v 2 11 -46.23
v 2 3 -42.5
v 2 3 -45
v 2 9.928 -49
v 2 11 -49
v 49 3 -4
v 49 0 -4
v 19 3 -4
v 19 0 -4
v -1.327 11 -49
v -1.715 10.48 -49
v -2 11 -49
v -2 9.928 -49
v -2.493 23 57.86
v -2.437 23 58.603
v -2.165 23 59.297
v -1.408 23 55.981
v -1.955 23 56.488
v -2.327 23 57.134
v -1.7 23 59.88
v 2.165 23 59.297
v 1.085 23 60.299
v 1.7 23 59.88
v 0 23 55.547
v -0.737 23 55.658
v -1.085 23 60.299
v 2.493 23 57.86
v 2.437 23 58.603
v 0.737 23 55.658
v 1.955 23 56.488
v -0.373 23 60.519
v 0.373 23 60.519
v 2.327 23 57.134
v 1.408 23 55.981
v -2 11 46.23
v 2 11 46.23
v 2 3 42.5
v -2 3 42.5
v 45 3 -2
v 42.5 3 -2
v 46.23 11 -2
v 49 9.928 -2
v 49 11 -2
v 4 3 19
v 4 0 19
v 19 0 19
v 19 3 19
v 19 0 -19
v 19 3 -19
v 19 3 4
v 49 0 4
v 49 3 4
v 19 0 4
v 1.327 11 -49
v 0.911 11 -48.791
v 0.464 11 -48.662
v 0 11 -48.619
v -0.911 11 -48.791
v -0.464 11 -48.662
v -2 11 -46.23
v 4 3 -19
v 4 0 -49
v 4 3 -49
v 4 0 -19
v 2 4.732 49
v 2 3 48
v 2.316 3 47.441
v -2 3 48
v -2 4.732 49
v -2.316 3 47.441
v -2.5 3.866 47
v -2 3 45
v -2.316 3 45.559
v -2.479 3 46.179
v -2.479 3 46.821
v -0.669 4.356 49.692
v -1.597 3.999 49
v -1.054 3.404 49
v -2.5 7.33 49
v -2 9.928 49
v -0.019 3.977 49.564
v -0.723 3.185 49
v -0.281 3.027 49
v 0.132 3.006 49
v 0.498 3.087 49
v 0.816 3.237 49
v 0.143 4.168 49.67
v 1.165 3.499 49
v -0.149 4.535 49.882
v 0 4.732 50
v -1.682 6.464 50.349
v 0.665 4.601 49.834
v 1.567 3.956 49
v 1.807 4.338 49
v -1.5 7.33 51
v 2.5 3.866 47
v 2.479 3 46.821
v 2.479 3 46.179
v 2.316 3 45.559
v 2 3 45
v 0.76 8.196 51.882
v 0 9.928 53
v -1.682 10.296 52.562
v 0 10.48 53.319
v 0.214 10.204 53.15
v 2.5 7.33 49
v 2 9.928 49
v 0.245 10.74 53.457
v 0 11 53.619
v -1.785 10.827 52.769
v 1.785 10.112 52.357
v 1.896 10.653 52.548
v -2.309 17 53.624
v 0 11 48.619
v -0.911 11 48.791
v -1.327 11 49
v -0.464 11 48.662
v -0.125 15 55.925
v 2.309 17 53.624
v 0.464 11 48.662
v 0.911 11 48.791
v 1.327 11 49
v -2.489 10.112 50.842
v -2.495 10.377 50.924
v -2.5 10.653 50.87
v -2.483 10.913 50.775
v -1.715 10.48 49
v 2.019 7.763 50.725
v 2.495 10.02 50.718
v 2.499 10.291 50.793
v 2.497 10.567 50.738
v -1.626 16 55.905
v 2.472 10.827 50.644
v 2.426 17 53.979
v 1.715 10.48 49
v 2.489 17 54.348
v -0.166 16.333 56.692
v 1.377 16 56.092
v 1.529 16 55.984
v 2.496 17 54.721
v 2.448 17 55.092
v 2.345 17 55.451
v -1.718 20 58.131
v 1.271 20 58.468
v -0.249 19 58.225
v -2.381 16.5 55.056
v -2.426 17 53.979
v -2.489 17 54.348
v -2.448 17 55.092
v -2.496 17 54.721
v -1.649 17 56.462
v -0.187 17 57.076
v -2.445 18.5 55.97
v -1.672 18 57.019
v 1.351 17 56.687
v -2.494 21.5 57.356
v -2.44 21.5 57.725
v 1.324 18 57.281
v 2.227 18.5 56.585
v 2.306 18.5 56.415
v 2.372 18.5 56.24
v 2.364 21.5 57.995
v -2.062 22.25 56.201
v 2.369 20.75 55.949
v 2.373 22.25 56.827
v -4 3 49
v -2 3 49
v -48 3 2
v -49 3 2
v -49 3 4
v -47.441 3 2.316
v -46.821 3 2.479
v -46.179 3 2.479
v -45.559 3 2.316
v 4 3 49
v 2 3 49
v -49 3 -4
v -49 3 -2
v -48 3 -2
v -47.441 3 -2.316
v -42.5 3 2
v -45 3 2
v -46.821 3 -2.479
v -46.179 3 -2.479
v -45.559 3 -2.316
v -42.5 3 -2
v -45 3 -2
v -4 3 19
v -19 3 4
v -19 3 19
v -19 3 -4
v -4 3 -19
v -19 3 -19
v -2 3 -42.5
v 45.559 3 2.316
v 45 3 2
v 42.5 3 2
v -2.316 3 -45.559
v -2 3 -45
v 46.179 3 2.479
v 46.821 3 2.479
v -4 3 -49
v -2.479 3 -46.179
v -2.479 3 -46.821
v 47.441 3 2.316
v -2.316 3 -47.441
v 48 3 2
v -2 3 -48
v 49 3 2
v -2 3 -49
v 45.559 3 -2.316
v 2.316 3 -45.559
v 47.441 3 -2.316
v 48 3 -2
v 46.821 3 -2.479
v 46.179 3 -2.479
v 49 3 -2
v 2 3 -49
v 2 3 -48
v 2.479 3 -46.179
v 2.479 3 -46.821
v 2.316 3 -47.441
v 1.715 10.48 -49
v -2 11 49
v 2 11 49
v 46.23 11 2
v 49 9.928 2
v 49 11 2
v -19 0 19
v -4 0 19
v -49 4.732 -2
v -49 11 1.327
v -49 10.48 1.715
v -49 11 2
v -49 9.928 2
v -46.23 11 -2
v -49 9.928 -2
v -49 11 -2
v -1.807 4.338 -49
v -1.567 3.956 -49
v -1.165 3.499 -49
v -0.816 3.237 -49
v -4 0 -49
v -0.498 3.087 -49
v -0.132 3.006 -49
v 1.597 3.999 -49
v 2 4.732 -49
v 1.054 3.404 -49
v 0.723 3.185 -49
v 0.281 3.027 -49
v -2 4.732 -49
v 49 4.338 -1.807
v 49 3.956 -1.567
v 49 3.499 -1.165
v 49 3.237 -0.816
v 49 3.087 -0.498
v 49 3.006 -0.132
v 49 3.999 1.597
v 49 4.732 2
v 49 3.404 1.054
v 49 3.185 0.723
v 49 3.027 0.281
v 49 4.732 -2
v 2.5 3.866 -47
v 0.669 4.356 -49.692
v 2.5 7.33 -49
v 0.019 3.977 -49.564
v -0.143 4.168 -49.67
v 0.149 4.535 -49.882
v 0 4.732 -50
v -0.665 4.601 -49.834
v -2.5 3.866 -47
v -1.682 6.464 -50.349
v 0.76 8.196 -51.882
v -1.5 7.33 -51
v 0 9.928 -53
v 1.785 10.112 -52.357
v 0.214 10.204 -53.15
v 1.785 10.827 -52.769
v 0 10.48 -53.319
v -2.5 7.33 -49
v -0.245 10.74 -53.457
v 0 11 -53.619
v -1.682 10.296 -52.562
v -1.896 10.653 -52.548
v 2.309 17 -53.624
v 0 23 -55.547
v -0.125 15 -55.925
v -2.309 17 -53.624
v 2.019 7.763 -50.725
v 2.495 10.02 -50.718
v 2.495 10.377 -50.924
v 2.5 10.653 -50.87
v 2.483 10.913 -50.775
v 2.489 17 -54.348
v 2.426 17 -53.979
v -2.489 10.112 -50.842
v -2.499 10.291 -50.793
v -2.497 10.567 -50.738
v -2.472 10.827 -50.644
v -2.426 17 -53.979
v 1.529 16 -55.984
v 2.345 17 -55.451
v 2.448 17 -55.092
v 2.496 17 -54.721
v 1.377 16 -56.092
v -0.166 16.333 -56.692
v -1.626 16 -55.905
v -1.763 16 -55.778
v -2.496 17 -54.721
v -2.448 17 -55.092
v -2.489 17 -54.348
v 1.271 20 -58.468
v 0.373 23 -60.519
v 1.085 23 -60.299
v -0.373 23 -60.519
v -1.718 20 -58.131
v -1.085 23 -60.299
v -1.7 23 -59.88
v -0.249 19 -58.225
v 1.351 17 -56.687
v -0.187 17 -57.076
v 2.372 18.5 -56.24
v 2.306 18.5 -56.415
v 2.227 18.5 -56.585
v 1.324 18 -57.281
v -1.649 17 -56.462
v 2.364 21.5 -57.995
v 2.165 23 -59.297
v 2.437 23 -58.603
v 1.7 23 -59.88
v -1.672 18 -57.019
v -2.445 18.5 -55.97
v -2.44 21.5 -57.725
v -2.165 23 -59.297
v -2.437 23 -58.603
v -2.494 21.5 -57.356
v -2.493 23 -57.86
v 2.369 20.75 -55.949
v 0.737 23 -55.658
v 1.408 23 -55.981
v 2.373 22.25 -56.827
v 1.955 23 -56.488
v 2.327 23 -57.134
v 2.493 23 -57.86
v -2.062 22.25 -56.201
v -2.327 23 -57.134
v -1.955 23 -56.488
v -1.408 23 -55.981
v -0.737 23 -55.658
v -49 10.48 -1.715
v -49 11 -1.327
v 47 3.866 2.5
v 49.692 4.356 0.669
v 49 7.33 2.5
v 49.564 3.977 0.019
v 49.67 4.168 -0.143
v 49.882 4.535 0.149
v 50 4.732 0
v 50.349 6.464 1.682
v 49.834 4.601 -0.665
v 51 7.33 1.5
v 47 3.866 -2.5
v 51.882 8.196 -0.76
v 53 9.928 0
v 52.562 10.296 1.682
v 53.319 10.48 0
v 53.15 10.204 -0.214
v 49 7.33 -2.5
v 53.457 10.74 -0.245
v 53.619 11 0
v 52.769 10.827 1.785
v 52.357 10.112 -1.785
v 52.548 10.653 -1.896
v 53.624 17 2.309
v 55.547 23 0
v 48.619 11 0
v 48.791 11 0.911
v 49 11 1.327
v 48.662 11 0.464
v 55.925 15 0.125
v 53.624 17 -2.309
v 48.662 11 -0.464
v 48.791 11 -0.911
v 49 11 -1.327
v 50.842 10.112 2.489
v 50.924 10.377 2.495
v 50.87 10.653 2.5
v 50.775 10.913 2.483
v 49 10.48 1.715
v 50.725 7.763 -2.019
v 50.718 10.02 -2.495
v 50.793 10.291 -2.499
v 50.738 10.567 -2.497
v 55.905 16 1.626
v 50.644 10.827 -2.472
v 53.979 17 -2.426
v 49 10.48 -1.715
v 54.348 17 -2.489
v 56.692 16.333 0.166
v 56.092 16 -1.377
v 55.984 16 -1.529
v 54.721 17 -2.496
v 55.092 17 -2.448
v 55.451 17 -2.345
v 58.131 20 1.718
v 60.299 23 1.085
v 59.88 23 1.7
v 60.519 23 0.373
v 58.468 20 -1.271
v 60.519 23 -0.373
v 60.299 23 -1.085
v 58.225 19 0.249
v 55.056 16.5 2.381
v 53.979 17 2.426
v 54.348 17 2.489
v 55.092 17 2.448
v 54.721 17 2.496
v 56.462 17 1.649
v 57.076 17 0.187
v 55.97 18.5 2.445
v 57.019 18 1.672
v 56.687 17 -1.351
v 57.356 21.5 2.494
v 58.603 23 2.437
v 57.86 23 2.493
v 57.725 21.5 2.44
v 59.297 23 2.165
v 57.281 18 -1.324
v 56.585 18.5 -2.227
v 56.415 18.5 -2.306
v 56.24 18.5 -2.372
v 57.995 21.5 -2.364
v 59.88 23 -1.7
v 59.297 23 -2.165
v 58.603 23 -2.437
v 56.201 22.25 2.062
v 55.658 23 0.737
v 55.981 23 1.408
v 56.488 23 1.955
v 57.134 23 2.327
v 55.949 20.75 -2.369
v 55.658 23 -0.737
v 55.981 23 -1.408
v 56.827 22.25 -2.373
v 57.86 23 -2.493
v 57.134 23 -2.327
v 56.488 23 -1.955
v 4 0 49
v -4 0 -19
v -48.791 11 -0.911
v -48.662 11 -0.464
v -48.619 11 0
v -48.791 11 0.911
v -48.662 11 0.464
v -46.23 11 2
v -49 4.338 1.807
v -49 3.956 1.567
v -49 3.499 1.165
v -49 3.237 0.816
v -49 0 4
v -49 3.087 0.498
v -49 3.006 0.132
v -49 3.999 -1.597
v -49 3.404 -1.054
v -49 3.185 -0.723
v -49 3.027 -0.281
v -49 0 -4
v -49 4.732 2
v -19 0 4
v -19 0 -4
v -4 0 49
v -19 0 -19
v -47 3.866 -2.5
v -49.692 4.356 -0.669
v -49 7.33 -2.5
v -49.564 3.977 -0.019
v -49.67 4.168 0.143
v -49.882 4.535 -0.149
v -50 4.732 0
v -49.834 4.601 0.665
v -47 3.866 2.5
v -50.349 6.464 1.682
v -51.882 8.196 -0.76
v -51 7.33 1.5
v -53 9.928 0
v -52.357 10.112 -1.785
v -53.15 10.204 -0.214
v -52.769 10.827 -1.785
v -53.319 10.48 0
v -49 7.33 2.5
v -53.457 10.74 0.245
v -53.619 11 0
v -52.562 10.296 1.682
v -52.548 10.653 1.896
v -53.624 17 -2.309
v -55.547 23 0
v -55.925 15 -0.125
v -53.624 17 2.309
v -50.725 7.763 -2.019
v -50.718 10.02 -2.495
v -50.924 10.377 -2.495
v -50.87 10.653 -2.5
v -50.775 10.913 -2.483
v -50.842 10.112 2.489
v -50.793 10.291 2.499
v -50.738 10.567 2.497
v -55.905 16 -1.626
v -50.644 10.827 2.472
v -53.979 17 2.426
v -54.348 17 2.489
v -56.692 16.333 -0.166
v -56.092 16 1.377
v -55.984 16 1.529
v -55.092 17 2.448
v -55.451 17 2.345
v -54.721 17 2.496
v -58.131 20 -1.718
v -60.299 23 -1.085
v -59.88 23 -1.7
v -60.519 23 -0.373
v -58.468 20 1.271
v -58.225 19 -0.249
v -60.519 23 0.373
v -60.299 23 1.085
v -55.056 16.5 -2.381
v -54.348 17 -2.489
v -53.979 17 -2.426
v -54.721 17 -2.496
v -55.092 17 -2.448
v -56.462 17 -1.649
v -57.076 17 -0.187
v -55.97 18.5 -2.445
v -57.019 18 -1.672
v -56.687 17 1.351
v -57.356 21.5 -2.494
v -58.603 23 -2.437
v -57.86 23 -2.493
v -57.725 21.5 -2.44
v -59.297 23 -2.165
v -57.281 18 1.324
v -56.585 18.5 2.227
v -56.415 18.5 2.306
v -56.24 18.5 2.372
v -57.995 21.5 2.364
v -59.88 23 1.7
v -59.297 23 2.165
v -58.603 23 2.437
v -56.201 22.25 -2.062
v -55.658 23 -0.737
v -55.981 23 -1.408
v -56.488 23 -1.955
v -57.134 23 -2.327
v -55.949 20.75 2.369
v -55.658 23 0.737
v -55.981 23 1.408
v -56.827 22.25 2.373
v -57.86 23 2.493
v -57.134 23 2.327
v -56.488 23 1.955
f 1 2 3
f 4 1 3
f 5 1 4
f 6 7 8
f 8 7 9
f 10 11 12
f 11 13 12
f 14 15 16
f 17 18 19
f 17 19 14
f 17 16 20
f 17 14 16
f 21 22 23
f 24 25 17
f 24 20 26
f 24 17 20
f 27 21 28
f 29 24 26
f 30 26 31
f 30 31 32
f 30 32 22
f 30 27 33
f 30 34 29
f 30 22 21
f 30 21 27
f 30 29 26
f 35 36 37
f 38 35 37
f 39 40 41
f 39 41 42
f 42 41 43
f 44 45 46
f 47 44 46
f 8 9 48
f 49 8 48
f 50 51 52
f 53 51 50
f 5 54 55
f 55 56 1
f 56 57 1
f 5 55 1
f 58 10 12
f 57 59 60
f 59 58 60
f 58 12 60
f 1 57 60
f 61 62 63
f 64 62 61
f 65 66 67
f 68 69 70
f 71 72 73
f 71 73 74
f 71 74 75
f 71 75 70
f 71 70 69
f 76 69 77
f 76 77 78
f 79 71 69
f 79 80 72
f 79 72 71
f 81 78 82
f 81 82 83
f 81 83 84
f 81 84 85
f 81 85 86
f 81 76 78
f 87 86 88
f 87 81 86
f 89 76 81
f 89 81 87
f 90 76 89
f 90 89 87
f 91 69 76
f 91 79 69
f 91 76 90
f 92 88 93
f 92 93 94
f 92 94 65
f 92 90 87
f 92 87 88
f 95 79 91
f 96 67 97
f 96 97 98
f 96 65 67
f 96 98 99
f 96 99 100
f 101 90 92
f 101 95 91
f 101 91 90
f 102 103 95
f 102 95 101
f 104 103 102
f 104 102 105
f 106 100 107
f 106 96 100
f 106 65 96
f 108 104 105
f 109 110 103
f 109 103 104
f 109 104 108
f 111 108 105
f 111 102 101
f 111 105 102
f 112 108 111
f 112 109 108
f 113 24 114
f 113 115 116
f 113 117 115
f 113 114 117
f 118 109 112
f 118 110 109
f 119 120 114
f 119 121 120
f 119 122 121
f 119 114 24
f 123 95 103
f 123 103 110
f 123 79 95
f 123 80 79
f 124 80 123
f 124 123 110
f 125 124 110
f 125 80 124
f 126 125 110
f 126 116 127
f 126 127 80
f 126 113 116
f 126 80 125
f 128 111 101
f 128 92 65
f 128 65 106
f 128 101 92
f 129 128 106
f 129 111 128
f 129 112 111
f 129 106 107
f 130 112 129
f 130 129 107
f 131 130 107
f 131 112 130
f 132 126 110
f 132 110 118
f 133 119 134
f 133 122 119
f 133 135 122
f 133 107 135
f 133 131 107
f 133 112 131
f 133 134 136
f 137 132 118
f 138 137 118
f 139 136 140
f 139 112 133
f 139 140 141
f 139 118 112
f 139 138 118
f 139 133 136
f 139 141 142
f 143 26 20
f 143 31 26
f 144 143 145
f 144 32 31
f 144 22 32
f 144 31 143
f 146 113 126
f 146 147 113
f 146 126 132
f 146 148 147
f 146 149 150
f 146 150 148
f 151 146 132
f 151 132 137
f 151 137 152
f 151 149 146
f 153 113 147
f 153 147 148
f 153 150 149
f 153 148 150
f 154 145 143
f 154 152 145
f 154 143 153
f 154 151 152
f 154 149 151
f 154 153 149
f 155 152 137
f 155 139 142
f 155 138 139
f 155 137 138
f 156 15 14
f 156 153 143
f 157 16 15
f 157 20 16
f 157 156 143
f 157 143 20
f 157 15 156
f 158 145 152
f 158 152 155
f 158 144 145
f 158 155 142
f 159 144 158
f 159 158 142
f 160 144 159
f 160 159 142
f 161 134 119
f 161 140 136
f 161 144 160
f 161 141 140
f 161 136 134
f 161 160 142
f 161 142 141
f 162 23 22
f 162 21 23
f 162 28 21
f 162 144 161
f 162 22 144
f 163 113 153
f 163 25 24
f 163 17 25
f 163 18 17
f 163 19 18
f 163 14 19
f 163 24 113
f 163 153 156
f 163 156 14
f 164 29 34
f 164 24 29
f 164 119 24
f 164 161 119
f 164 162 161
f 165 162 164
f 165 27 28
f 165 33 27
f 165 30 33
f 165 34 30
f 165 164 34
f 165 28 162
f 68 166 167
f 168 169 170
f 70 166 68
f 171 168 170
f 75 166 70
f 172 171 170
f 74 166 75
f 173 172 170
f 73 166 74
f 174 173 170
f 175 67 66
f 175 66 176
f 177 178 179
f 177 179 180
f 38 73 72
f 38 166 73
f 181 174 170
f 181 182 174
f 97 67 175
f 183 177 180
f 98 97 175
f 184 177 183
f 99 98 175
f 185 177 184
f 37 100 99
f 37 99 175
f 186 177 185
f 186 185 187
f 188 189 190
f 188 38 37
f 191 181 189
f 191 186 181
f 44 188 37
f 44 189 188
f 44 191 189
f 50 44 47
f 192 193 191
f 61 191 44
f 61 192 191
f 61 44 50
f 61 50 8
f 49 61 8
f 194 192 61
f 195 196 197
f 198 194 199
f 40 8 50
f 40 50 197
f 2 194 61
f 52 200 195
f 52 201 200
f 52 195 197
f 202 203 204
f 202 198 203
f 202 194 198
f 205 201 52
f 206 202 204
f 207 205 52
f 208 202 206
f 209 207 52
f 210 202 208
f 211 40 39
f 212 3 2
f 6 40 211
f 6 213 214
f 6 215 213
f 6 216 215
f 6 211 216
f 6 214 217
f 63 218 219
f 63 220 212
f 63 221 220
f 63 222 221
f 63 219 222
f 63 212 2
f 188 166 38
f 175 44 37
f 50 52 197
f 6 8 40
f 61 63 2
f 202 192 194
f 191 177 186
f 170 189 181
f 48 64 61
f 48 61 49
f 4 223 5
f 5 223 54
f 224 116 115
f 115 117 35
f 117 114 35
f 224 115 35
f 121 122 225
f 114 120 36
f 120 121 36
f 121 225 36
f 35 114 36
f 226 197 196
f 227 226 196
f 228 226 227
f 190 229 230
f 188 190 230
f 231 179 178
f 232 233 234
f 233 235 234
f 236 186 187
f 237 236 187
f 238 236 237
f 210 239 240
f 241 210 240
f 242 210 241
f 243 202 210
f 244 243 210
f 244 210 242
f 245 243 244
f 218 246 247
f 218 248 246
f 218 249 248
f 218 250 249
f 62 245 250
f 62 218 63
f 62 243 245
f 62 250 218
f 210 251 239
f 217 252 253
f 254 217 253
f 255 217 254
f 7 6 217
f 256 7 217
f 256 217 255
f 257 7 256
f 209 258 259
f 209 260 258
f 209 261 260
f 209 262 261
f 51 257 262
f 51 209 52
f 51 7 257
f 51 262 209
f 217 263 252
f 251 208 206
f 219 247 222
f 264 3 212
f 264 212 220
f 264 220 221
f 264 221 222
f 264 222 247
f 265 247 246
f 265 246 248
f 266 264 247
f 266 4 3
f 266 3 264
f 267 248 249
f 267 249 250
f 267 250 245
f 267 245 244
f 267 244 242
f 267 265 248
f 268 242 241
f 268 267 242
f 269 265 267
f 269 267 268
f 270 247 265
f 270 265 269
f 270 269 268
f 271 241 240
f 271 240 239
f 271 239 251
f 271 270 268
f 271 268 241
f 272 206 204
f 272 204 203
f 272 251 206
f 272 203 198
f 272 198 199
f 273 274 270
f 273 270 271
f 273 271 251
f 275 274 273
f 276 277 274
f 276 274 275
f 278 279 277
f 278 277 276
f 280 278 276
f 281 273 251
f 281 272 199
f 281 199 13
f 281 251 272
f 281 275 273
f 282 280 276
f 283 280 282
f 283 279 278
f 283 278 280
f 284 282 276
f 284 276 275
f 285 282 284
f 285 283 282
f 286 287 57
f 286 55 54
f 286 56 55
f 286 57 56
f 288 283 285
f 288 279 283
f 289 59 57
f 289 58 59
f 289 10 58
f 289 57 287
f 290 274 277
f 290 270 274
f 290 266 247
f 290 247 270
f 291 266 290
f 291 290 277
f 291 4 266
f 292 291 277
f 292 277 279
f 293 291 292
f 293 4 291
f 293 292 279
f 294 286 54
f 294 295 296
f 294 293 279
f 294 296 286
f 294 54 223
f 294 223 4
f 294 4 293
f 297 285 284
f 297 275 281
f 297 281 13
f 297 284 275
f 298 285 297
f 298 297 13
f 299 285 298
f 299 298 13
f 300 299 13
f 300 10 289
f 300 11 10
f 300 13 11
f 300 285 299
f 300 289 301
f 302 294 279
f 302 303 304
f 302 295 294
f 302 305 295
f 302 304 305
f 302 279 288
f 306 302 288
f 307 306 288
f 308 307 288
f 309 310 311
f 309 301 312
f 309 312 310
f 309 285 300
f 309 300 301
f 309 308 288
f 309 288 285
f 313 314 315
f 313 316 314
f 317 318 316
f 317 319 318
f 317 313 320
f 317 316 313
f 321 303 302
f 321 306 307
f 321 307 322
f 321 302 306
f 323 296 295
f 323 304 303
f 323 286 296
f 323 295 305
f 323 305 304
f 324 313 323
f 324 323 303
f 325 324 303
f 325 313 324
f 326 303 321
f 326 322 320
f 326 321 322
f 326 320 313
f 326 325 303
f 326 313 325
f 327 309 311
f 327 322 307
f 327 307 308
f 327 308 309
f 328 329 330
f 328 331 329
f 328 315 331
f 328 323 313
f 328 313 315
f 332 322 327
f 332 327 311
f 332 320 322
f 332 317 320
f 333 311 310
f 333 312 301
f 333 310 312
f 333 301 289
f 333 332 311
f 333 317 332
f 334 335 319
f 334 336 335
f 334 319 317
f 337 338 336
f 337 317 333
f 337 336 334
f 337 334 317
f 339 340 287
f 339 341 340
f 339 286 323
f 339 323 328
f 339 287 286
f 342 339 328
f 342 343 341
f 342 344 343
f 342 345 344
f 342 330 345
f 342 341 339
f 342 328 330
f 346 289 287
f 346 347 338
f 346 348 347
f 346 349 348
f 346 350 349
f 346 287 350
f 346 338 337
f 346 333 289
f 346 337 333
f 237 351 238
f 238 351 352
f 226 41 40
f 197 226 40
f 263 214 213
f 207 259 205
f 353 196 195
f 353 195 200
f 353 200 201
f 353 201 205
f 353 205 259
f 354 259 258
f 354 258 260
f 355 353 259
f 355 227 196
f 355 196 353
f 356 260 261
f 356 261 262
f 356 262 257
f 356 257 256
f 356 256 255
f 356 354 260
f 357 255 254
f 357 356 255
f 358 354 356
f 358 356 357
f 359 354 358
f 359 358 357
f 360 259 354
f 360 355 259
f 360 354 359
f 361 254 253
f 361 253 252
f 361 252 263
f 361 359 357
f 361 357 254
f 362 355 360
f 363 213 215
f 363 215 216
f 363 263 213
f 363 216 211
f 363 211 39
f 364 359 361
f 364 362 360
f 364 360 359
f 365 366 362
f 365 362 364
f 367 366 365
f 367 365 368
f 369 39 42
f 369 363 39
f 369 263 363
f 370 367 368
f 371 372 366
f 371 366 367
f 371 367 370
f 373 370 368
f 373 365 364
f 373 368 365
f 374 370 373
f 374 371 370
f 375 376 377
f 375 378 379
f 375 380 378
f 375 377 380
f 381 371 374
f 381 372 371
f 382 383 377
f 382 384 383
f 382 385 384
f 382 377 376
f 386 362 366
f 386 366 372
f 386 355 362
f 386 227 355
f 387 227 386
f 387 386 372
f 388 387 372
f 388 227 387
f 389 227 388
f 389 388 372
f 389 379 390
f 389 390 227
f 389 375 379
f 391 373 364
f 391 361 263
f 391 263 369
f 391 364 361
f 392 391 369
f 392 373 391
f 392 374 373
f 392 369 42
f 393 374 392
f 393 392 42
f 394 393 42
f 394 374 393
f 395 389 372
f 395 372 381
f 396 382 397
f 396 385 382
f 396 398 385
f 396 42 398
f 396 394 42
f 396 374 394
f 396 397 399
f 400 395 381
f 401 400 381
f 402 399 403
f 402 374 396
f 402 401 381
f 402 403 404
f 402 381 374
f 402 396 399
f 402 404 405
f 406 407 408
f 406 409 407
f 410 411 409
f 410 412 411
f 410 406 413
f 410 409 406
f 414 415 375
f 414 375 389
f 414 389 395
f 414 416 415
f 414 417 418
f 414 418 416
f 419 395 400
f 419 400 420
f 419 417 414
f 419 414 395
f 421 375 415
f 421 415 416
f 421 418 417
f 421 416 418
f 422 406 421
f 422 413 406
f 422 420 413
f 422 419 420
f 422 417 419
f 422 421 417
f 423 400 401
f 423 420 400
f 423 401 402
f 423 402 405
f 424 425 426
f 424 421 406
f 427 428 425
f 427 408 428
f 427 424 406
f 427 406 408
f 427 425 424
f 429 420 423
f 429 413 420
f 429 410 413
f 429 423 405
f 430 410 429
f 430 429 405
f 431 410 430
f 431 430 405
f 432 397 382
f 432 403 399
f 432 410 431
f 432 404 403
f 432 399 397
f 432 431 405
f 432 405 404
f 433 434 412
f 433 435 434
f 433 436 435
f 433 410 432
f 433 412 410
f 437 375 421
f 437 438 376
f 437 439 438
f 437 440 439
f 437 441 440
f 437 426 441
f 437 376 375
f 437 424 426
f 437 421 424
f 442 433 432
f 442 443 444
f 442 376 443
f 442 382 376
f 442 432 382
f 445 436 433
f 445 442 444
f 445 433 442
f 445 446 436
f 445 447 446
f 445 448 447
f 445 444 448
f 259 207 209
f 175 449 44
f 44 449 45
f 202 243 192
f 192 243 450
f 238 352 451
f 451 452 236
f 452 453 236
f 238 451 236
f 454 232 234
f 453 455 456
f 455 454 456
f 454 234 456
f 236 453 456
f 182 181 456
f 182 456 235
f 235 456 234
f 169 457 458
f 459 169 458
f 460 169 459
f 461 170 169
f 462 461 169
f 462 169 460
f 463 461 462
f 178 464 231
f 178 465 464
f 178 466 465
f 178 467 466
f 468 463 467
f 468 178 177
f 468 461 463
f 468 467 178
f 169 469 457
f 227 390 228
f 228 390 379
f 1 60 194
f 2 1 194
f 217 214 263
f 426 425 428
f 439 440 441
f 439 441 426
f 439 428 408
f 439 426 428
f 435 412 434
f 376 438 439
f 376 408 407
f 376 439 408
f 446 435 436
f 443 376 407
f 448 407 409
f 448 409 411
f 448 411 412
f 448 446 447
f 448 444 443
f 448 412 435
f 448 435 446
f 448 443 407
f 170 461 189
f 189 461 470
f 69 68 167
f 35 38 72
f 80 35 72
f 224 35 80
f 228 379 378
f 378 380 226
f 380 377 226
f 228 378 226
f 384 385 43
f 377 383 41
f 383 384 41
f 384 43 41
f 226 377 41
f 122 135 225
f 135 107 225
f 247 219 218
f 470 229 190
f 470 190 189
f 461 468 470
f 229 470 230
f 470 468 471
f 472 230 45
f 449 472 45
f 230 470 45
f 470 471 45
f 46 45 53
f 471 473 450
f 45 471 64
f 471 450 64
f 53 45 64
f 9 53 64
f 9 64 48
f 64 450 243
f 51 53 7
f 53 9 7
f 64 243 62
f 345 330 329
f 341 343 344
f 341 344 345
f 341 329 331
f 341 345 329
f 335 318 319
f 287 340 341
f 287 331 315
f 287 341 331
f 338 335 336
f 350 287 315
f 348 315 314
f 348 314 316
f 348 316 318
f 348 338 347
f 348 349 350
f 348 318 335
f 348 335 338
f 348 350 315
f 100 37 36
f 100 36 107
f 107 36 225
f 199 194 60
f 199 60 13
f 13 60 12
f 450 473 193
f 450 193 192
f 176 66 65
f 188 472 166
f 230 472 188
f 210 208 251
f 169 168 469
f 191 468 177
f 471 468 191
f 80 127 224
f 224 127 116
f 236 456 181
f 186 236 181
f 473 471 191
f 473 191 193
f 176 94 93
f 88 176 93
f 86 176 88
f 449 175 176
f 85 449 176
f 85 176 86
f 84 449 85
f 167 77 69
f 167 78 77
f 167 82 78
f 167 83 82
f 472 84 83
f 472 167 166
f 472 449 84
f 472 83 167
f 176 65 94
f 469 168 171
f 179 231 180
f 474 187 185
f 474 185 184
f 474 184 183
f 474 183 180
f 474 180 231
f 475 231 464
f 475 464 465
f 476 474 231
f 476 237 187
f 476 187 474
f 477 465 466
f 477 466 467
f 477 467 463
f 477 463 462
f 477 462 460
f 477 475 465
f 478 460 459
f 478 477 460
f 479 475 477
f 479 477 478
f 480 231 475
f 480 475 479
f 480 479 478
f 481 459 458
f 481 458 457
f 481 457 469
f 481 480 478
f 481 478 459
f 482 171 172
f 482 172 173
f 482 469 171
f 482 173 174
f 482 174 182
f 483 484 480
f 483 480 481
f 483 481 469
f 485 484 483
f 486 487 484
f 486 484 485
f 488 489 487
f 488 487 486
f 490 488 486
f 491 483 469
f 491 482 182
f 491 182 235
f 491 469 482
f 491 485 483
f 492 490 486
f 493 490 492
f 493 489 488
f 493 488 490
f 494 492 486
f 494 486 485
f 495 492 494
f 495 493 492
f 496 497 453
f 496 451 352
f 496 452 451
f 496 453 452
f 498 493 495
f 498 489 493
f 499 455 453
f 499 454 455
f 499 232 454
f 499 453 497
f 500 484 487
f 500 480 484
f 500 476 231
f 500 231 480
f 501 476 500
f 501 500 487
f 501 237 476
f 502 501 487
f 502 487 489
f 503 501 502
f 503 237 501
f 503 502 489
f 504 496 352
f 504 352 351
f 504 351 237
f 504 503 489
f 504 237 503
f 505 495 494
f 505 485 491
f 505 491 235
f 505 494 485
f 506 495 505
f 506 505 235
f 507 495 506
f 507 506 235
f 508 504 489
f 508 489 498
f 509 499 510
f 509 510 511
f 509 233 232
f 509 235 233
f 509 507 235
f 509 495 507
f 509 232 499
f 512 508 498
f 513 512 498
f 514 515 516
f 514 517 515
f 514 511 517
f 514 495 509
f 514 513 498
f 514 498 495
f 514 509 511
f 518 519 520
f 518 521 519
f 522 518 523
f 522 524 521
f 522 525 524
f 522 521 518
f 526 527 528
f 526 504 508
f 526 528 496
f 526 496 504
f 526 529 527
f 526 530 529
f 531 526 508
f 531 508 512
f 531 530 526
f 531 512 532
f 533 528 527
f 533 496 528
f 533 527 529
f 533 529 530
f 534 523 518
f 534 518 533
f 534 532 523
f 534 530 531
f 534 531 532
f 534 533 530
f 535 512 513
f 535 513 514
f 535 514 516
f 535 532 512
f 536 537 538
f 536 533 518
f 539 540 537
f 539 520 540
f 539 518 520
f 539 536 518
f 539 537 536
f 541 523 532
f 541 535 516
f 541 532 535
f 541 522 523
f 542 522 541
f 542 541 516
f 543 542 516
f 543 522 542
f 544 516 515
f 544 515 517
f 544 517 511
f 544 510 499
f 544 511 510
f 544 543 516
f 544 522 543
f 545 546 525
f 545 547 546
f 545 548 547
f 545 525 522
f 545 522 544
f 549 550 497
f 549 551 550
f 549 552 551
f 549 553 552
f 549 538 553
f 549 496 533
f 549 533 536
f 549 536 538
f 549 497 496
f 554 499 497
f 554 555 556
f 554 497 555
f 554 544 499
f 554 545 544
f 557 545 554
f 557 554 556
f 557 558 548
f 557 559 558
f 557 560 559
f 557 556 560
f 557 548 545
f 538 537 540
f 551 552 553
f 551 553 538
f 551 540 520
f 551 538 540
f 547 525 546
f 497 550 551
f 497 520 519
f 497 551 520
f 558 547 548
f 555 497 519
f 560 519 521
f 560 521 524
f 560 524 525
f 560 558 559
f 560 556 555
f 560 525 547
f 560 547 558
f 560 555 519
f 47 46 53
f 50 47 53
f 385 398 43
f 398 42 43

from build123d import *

# Parameters (mm, degrees)
SKETCH1_W           = 38
SKETCH1_H           = 38
BOSS_EXTRUDE1_DEPTH = 3
SKETCH2_W           = 30
SKETCH2_H           = 8
BOSS_EXTRUDE2_DEPTH = 3
SKETCH8_R           = 2.5
BOSS_EXTRUDE5_DEPTH = 2
CIRPATTERN1_COUNT   = 4


with BuildPart() as part:
    # Sketch1 → Boss-Extrude1 (new body)
    with BuildSketch(Plane(origin=(0, 0, 0), x_dir=(1, 0, 0), z_dir=(0, 1, 0))):
        Rectangle(SKETCH1_W, SKETCH1_H)
    extrude(amount=BOSS_EXTRUDE1_DEPTH)

    # Sketch2 → Boss-Extrude2 (add)
    with BuildSketch(Plane(origin=(0, 0, 0), x_dir=(1, 0, 0), z_dir=(0, 1, 0))):
        with Locations((-34, 0)):
            Rectangle(SKETCH2_W, SKETCH2_H)
    boss_extrude2 = extrude(amount=BOSS_EXTRUDE2_DEPTH)

    # Sweep1: sweep along a path in Sketch7
    with BuildLine(Plane.XY) as sweep1_path:
        Line((-46.5, 3), (-58.047005384, 23))
    # Sketch8 → Sweep1 (sweep)
    with BuildSketch(Plane(origin=(0, 3, 0), x_dir=(1, 0, 0), z_dir=(0, 1, 0))):
        with Locations((-46.5, 0)):
            Circle(SKETCH8_R)
    sweep1 = sweep(path=sweep1_path.line)

    # Sketch6 → Boss-Extrude5 (add, symmetric)
    with BuildSketch(Plane.XY):
        Polygon((-46.230461265, 11), (-42.5, 3), (-46.5, 3), (-49, 3), (-49, 11), align=None)
    boss_extrude5 = extrude(amount=BOSS_EXTRUDE5_DEPTH, both=True)

    # CirPattern1: Boss-Extrude2, Sweep1, Boss-Extrude5 ×4 about axis
    cirpattern1_axis = Axis((0, 0, 0), (0, 1, 0))
    for i in range(1, CIRPATTERN1_COUNT):
        add(boss_extrude2.rotate(cirpattern1_axis, i * 360 / CIRPATTERN1_COUNT))
        add(sweep1.rotate(cirpattern1_axis, i * 360 / CIRPATTERN1_COUNT))
        add(boss_extrude5.rotate(cirpattern1_axis, i * 360 / CIRPATTERN1_COUNT))


solid = part.part
